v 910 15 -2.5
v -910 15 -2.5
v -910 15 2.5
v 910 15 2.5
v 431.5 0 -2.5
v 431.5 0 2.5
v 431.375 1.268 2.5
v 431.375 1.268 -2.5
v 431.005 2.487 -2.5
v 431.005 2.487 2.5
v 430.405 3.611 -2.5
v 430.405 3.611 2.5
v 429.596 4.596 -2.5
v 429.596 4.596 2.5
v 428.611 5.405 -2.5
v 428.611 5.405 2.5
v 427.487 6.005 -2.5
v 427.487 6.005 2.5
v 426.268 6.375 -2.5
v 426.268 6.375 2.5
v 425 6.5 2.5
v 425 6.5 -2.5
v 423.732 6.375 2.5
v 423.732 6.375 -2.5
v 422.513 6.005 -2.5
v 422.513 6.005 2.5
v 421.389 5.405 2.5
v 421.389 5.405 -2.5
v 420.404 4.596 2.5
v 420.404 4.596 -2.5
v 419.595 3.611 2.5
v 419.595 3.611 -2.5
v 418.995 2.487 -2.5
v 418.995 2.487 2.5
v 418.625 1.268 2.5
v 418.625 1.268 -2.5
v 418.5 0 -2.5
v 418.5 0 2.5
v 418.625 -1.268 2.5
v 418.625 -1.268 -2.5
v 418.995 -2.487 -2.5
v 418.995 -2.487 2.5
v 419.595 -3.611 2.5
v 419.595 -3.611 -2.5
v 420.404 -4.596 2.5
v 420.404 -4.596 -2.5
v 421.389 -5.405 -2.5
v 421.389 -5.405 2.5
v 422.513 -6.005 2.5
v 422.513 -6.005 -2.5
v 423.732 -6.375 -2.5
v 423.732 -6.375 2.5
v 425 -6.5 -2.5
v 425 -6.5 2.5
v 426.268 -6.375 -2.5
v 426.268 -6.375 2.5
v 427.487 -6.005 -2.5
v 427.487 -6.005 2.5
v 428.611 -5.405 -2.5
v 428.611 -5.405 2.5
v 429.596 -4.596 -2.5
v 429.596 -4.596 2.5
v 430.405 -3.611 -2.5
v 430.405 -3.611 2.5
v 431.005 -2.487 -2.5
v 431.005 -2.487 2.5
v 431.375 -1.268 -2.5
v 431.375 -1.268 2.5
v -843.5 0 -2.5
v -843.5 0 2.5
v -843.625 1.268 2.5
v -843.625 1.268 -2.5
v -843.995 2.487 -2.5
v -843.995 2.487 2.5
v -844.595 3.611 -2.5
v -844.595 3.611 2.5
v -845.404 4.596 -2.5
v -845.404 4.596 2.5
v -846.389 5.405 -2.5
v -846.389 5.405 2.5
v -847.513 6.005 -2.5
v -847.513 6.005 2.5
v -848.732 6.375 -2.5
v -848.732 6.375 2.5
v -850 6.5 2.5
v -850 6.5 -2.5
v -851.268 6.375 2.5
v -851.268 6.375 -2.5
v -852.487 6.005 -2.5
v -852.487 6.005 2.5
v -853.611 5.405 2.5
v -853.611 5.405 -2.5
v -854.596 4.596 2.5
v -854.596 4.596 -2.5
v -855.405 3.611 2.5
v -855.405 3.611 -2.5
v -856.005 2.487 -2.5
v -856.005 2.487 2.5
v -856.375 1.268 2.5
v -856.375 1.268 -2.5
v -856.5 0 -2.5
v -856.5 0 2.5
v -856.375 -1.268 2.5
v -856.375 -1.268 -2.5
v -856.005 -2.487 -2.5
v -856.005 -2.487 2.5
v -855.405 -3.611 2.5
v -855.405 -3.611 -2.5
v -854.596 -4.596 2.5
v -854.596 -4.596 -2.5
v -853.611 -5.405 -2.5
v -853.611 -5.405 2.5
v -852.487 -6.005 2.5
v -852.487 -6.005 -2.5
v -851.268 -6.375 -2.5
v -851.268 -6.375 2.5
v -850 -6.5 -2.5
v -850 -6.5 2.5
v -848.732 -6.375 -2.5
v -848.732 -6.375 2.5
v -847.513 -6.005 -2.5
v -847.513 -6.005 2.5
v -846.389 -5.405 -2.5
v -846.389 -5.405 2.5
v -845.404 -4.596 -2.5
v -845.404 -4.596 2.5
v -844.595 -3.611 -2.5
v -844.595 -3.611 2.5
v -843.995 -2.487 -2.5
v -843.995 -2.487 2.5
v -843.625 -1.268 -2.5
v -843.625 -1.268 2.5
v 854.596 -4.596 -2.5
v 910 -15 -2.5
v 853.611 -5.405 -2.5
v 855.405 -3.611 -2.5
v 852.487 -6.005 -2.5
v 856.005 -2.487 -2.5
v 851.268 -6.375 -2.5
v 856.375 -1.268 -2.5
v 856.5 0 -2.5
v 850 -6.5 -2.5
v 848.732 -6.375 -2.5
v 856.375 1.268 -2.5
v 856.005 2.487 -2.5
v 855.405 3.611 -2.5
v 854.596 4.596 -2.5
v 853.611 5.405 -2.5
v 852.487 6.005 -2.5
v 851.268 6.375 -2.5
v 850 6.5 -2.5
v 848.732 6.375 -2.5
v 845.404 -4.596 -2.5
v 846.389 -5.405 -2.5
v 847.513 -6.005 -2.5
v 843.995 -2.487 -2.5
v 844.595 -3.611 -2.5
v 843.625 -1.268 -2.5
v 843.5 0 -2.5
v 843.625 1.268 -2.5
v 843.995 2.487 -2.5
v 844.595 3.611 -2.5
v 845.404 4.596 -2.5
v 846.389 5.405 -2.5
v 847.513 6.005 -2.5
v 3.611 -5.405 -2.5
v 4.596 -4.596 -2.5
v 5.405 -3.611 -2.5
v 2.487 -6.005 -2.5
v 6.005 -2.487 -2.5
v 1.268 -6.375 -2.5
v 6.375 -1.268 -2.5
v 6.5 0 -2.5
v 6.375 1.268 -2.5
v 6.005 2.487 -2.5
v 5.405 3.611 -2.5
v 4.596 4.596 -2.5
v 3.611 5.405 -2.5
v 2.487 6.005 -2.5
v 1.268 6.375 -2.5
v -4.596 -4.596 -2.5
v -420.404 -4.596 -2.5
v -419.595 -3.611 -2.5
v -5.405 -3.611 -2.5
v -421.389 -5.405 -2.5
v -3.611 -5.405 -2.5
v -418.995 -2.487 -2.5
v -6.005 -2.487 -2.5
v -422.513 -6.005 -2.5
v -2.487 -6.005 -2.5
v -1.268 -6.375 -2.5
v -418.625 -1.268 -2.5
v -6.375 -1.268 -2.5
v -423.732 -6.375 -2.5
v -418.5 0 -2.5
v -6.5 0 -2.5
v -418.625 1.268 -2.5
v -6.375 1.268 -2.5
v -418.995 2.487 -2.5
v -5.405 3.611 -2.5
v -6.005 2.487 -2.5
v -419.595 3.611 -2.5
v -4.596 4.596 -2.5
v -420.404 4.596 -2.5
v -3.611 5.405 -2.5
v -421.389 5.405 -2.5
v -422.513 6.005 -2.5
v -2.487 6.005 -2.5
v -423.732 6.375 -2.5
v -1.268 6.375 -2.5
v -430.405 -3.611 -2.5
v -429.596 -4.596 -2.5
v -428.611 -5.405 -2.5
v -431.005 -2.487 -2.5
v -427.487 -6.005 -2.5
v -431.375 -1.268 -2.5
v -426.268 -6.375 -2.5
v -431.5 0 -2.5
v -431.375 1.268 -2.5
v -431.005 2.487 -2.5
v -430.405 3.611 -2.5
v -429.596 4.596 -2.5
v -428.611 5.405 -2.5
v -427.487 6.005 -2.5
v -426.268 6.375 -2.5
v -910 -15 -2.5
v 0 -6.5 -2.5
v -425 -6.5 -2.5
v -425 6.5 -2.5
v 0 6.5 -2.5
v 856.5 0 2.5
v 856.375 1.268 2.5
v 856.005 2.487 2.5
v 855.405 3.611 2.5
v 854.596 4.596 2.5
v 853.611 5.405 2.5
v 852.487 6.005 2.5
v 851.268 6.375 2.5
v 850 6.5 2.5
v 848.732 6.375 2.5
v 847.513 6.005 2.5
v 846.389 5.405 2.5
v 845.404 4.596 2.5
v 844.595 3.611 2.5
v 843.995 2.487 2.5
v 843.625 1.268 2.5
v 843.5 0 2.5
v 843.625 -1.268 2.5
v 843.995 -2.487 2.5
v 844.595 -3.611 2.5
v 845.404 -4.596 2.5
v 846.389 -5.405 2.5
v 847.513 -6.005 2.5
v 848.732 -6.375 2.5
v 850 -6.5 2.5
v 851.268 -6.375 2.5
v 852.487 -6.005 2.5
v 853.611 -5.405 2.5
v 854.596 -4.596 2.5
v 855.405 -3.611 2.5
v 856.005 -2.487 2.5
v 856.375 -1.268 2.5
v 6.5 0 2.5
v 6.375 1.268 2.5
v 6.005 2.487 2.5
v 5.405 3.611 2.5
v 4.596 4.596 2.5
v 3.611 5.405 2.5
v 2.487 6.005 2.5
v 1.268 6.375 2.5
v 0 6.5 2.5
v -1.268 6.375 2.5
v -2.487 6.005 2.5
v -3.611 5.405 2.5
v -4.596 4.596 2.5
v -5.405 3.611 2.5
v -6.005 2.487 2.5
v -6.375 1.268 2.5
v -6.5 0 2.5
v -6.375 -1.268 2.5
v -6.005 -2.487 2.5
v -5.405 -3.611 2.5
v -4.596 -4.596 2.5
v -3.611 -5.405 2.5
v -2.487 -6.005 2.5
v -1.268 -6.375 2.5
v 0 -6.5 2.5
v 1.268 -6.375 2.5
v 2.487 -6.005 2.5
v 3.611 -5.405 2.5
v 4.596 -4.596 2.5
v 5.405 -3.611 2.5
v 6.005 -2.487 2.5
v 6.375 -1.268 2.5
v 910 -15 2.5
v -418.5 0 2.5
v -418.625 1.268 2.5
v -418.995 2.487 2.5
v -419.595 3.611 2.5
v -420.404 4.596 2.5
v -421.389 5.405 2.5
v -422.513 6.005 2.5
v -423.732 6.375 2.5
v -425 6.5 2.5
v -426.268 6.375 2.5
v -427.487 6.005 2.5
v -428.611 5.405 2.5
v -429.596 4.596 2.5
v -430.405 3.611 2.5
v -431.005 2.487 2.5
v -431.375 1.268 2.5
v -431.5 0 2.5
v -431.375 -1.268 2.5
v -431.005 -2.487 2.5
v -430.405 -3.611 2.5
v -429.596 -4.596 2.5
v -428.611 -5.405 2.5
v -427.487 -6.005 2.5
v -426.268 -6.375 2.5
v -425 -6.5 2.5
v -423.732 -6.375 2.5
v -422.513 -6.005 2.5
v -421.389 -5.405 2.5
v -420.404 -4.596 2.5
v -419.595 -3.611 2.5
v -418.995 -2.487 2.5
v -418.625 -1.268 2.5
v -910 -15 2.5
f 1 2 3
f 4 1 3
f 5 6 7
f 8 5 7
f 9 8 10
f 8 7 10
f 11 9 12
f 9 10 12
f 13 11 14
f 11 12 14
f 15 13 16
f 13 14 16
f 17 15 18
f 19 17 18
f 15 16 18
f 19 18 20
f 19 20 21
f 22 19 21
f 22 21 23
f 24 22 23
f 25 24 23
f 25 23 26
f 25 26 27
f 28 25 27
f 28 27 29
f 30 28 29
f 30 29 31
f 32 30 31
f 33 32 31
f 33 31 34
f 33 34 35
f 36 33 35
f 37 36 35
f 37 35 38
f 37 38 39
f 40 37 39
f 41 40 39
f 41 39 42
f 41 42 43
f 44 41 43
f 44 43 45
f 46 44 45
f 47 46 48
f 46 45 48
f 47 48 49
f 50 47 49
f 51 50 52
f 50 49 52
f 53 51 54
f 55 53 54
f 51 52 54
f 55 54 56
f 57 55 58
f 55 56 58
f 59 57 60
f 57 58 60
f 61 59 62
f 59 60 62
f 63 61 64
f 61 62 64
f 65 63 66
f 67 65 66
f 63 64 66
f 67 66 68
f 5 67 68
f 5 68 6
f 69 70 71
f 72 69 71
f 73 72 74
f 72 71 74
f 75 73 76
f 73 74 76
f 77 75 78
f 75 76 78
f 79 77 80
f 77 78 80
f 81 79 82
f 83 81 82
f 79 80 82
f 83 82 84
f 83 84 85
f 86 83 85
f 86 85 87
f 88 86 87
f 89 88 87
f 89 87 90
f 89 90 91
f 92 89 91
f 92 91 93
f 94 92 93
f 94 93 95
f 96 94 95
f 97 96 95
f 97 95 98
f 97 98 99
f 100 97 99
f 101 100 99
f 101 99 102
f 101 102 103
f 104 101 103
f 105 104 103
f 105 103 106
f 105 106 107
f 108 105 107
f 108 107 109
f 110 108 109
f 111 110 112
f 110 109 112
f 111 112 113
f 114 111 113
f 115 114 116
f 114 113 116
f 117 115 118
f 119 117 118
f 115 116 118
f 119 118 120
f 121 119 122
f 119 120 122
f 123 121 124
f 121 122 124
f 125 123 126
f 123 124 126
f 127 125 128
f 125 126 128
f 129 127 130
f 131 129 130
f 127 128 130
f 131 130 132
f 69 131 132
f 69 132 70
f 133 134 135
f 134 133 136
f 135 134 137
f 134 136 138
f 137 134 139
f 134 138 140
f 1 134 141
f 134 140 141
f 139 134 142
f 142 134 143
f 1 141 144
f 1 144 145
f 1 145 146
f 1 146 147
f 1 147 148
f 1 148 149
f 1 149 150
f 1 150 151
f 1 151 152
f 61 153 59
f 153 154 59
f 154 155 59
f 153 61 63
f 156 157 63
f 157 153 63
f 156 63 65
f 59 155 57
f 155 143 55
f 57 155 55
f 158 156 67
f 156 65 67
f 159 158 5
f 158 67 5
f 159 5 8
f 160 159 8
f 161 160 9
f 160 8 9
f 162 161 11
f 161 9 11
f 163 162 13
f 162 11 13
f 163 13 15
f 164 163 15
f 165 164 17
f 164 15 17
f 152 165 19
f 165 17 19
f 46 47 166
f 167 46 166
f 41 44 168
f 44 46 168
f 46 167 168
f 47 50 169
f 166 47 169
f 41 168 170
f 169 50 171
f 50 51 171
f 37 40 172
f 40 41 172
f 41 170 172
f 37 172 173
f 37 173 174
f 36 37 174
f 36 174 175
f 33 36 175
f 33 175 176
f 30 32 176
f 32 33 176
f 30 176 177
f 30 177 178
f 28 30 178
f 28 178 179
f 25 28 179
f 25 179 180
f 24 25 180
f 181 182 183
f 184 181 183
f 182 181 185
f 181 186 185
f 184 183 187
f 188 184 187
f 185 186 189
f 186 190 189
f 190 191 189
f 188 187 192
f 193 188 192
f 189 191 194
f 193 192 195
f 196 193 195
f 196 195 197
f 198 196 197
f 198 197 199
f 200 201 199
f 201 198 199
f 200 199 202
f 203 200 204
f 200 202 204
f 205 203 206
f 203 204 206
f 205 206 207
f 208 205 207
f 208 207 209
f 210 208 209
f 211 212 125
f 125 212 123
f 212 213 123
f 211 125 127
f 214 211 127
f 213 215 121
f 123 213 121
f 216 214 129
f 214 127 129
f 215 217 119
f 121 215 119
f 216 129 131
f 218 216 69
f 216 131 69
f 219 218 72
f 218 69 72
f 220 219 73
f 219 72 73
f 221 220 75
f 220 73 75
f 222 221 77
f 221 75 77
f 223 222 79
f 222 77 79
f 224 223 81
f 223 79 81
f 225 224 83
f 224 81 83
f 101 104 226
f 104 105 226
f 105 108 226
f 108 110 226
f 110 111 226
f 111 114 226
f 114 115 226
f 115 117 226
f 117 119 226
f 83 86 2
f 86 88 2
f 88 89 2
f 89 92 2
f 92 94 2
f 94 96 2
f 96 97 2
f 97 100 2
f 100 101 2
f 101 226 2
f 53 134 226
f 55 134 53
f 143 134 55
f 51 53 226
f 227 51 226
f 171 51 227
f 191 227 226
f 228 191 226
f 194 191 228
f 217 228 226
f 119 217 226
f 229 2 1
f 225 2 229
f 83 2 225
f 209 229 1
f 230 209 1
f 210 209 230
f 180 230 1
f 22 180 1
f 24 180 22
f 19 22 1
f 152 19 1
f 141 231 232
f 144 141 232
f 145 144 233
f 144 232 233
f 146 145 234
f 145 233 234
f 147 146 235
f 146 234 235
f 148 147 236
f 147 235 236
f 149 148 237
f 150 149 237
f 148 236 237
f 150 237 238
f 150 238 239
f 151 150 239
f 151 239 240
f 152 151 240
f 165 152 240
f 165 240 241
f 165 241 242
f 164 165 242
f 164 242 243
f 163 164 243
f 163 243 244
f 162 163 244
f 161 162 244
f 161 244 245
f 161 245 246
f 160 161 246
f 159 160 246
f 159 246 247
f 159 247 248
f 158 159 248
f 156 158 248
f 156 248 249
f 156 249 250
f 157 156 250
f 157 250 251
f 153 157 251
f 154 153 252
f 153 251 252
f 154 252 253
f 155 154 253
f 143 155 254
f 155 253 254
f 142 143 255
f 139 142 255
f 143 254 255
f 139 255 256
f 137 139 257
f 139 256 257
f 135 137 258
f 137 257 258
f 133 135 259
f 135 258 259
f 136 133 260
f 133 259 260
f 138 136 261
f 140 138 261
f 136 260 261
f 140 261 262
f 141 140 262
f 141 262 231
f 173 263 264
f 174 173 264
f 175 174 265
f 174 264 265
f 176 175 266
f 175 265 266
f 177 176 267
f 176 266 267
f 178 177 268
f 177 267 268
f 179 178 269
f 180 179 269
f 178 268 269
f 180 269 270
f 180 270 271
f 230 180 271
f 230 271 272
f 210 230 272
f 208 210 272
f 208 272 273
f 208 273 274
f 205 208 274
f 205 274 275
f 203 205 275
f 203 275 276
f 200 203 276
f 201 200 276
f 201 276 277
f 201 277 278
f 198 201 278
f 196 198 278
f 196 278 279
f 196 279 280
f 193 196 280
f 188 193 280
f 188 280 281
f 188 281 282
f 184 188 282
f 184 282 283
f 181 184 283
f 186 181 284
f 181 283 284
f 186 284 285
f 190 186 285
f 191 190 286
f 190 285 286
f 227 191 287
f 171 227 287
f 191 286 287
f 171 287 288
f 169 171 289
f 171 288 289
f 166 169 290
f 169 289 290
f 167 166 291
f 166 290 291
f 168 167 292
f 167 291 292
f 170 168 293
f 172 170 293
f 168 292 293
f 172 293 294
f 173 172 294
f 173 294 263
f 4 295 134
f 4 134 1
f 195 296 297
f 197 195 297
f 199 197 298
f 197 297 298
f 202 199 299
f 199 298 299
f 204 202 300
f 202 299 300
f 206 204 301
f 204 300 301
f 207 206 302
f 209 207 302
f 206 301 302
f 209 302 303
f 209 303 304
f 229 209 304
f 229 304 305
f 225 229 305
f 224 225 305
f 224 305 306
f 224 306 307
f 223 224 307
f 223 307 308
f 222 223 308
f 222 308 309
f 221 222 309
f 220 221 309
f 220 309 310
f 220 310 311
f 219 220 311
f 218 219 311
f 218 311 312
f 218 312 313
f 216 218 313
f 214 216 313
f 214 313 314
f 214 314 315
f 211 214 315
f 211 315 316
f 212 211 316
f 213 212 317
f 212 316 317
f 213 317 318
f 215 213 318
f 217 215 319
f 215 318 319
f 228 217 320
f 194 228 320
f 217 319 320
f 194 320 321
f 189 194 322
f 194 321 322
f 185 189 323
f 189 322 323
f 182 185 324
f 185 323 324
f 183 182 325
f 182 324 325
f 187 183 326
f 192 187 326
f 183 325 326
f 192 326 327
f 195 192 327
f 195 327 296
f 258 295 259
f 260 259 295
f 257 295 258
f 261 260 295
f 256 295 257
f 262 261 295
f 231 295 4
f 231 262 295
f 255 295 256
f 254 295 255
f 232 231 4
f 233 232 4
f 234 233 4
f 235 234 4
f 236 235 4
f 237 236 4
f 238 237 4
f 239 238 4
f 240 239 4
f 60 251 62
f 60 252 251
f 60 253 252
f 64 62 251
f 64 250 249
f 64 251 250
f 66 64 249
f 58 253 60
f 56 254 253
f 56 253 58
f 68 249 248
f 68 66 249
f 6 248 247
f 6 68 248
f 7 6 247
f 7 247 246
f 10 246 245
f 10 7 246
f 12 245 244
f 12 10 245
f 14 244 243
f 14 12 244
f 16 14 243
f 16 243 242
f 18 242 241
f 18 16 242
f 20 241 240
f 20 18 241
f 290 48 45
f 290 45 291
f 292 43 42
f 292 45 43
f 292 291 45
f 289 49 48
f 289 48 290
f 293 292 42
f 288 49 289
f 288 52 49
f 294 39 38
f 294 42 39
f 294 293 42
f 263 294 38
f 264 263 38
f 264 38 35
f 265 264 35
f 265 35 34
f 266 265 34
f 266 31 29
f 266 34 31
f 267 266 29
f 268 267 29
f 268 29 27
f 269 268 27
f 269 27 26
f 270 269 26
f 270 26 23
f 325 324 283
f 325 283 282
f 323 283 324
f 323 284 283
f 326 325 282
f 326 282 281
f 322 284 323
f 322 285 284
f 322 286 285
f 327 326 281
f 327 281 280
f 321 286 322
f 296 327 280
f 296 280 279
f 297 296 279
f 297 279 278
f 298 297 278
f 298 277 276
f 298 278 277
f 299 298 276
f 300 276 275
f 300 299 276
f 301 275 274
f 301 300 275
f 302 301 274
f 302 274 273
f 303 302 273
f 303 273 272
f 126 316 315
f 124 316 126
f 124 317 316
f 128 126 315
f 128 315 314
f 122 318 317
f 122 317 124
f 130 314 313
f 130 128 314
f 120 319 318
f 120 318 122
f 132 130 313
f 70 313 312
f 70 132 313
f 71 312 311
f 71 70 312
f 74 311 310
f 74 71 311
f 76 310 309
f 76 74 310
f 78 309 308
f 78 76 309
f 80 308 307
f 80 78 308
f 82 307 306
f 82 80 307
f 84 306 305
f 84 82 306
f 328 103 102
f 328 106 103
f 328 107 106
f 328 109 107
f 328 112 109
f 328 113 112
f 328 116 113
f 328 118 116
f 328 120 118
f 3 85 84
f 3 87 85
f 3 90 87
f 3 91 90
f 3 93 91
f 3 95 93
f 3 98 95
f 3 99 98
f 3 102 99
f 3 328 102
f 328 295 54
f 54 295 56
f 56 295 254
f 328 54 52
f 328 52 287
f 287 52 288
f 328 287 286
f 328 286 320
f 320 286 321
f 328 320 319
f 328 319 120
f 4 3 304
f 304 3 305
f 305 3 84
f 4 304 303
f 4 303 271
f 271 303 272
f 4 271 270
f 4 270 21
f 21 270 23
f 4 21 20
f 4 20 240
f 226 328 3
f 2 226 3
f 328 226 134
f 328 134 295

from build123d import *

# Parameters (mm, degrees)
PLAT_W                          = 30
PLAT_H                          = 5
EL_MENT_M_CANO_SOUD_1_DEPTH     = 1820
DIAM_TRE_DU_PER_AGE_13_0_13_1_D = 13
R_P_TITION_LIN_AIRE2_COUNT      = 5
R_P_TITION_LIN_AIRE2_PITCH      = 425


with BuildPart() as part:
    # plat → Elément mécano-soudé1 (new body)
    with BuildSketch(Plane.YZ.offset(-910)):
        Rectangle(PLAT_W, PLAT_H)
    extrude(amount=EL_MENT_M_CANO_SOUD_1_DEPTH)

    # Diamètre du perçage Ø13.0 (13)1 (through all)
    with Locations(Plane(origin=(0, 0, -2.5), x_dir=(-1, 0, 0), z_dir=(0, 0, -1))):
        with Locations((850, 0)):
            diam_tre_du_per_age_13_0_13_1 = Hole(DIAM_TRE_DU_PER_AGE_13_0_13_1_D / 2)

    # Répétition linéaire2: Diamètre du perçage Ø13.0 (13)1 ×5
    with Locations(*[(i * R_P_TITION_LIN_AIRE2_PITCH, 0, 0) for i in range(1, R_P_TITION_LIN_AIRE2_COUNT)]):
        add(diam_tre_du_per_age_13_0_13_1, mode=Mode.SUBTRACT)


solid = part.part
